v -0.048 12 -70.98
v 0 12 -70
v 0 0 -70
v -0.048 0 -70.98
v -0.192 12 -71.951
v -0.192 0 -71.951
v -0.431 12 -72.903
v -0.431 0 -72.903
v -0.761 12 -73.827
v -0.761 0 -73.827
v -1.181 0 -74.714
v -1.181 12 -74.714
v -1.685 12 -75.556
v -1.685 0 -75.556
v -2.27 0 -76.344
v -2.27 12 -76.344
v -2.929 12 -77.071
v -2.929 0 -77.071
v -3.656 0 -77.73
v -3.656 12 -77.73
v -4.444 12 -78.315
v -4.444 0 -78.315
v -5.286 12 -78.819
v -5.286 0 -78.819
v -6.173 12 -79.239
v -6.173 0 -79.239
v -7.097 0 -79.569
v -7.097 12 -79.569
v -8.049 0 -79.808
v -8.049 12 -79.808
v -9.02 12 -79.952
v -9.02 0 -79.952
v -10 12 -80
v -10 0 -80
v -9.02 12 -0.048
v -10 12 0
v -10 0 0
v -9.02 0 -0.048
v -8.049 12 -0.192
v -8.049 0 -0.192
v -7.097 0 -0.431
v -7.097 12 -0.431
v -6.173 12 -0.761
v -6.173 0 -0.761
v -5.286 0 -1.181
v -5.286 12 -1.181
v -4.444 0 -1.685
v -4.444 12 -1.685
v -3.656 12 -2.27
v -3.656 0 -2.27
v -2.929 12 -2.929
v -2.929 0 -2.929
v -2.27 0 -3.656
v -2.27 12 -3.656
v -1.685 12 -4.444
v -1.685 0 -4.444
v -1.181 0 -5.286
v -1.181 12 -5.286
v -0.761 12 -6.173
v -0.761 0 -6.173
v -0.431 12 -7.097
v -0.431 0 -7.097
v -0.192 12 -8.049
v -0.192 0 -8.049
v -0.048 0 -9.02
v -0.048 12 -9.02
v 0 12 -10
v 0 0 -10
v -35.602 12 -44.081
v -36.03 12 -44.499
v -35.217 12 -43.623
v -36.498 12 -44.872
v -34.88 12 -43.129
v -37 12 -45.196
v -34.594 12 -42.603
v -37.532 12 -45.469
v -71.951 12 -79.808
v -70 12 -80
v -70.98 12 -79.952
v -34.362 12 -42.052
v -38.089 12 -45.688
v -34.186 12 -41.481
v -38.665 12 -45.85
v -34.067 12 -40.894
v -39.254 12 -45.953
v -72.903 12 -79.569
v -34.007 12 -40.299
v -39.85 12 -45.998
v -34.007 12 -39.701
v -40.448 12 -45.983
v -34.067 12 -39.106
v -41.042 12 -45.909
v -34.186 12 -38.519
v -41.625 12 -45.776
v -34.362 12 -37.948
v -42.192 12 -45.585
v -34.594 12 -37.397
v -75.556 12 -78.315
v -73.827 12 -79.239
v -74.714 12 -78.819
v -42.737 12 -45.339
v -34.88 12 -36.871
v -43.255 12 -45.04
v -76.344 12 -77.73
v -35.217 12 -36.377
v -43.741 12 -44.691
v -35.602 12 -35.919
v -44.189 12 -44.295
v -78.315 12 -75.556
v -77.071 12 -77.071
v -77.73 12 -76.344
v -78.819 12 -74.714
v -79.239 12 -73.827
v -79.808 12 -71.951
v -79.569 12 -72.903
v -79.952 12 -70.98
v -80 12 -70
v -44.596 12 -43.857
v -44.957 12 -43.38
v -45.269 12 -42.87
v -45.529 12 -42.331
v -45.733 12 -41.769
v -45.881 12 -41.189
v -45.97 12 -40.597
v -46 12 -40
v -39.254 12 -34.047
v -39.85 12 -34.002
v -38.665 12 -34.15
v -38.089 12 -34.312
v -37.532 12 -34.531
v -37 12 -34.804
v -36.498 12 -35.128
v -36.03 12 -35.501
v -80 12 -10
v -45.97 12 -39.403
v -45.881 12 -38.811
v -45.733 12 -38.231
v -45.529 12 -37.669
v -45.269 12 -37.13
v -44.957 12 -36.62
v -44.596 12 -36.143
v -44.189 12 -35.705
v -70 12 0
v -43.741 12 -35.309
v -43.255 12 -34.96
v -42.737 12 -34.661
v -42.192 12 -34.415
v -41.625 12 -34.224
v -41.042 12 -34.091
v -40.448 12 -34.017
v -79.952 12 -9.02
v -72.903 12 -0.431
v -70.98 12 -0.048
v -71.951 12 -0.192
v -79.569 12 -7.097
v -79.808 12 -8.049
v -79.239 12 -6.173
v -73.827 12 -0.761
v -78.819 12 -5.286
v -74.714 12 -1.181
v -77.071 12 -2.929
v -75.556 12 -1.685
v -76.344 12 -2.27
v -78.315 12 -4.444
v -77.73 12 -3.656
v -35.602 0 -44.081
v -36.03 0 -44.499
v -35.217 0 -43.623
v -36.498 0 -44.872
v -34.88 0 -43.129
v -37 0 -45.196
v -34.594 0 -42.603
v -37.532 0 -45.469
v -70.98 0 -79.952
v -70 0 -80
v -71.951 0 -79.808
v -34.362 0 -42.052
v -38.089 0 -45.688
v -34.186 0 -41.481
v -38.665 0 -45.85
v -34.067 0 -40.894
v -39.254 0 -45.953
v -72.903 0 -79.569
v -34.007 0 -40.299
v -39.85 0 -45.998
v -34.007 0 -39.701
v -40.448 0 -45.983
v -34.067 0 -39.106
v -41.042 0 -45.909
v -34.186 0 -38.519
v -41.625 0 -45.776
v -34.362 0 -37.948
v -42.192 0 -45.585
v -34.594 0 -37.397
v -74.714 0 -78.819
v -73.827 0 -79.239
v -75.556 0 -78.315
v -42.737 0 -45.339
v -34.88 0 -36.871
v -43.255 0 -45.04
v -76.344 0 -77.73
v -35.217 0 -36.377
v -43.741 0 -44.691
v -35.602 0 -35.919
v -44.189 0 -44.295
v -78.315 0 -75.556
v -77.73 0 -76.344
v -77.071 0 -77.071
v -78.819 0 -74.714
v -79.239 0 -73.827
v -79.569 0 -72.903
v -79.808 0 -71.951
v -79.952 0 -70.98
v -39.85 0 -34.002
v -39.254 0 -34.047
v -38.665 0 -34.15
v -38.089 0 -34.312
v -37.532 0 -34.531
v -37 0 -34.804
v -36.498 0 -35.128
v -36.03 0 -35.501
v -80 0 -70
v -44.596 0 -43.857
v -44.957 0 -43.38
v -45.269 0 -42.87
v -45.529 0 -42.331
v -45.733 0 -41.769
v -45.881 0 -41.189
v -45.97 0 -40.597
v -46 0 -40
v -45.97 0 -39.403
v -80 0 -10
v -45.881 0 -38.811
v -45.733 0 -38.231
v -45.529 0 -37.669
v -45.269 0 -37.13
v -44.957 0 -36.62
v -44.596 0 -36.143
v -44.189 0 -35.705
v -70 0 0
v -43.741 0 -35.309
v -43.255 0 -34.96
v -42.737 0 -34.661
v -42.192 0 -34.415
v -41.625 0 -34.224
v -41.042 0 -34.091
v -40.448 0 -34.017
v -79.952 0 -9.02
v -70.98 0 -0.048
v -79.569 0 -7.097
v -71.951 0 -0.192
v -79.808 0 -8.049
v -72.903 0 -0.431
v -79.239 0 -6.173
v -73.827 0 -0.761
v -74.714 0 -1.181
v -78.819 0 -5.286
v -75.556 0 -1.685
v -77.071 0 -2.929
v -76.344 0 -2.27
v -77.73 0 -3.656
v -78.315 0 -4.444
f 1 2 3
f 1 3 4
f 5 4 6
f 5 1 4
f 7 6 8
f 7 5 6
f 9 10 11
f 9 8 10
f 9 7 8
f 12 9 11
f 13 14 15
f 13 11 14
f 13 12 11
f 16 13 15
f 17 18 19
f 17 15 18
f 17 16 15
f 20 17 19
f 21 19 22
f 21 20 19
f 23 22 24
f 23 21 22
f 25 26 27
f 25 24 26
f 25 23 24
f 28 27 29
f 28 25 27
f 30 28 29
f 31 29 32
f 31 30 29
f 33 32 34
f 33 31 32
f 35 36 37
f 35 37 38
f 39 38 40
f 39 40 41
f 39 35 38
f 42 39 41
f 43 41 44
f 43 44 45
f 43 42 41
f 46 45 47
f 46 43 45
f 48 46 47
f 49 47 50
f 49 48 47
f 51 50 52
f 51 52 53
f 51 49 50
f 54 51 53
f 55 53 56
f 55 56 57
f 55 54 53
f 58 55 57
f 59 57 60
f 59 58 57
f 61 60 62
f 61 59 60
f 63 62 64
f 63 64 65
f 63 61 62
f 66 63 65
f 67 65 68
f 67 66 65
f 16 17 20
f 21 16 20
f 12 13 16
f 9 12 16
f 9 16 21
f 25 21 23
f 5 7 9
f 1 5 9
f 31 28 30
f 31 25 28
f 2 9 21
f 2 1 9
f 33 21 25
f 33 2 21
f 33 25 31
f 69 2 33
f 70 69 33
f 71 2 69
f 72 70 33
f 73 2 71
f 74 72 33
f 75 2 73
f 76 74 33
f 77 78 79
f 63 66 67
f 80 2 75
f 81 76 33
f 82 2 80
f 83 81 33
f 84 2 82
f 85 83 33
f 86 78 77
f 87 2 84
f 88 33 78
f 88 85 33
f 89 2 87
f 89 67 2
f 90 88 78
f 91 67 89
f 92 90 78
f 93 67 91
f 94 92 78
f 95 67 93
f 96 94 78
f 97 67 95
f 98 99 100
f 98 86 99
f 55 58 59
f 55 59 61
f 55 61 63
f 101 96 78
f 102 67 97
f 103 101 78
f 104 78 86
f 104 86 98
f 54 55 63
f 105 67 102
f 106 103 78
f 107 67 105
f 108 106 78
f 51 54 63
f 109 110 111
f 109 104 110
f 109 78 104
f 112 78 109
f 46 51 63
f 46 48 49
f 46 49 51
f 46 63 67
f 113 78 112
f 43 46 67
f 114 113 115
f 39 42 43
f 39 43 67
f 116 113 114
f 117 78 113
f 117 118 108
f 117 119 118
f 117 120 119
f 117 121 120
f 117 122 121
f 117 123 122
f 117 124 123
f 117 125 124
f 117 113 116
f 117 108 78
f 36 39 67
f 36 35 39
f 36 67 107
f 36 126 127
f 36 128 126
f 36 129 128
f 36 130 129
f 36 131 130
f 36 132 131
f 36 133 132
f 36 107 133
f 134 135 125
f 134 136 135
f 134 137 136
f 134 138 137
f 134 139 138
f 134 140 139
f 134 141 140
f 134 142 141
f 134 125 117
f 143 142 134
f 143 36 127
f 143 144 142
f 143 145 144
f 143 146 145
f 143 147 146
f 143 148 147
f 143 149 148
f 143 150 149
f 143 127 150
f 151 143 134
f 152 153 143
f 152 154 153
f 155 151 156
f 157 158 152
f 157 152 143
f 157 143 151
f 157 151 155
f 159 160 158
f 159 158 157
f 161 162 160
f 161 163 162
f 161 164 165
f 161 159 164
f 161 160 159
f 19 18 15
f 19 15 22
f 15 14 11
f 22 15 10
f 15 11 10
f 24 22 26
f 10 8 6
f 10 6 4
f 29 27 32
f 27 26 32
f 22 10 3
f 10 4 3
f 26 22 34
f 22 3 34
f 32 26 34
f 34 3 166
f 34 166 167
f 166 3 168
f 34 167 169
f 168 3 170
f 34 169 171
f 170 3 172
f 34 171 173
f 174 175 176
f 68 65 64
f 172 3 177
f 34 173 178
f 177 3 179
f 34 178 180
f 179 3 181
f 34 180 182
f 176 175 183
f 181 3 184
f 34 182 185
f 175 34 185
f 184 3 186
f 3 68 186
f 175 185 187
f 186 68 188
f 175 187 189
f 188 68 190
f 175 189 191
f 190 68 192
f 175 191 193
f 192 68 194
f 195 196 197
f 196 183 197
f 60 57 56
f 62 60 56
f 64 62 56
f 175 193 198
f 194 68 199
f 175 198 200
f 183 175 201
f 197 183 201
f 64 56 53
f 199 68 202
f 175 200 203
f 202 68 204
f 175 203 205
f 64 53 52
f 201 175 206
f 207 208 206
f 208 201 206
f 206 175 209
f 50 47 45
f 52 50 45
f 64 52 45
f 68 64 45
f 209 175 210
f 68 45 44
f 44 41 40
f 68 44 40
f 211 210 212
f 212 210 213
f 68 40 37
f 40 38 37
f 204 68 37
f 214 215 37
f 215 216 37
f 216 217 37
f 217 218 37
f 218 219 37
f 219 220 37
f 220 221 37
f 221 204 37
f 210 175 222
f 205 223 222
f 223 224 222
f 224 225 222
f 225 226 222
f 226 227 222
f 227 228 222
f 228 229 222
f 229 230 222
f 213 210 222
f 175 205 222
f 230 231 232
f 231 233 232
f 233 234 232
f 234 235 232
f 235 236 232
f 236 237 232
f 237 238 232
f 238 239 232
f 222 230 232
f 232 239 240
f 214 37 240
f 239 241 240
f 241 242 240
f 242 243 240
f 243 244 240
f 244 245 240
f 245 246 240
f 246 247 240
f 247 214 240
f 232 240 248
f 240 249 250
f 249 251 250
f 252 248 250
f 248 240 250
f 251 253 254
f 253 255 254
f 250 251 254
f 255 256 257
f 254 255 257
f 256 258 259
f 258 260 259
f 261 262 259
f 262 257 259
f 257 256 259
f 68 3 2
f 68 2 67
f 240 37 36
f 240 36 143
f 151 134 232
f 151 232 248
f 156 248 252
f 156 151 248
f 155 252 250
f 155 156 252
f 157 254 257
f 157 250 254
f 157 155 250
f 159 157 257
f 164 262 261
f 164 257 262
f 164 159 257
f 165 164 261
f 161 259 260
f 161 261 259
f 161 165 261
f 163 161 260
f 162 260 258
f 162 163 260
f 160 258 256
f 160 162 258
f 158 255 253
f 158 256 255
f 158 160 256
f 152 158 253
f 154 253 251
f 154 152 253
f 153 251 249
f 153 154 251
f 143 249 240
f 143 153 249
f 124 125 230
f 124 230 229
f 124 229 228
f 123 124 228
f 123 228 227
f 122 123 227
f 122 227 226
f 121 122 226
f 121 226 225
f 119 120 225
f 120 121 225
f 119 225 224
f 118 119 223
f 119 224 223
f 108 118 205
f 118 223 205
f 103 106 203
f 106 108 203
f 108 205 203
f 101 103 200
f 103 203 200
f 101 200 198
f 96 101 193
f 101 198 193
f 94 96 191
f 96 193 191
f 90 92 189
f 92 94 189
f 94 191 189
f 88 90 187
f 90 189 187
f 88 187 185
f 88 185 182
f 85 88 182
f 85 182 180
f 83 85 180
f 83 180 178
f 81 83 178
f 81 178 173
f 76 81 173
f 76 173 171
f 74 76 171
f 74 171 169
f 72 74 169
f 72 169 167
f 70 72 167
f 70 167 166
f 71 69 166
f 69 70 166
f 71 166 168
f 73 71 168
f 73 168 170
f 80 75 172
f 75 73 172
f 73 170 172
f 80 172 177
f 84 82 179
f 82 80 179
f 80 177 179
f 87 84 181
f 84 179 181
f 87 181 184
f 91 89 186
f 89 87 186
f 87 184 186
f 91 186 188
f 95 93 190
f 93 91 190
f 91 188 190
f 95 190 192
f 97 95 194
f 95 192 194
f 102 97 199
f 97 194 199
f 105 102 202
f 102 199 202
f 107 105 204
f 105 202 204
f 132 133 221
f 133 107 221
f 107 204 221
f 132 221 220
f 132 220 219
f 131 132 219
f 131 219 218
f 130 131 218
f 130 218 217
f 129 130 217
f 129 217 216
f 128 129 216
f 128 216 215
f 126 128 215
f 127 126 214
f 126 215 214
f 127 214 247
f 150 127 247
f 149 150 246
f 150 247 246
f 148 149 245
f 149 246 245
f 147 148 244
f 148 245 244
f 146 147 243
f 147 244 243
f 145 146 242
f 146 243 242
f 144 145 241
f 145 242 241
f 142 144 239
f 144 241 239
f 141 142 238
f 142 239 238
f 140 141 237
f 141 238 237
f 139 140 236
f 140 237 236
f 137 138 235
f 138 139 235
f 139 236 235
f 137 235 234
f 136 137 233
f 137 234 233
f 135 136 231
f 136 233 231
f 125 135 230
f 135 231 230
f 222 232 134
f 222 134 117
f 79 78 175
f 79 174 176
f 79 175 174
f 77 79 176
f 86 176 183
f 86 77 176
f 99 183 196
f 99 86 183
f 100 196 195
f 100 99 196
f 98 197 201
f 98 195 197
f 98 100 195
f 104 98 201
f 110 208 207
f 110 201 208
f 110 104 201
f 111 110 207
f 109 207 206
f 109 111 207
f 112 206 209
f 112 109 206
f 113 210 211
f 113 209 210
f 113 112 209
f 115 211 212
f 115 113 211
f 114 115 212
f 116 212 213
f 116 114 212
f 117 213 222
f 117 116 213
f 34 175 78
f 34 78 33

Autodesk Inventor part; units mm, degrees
ref_plane "YZ Plane" through (0, 0, 0) normal (1, 0, 0) x (0, 1, 0)
ref_plane "XZ Plane" through (0, 0, 0) normal (0, 1, 0) x (-1, 0, 0)
ref_plane "XY Plane" through (0, 0, 0) normal (0, 0, 1) x (1, 0, 0)
sketch "Esboço1" plane through (0, 0, 0) normal (0, 1, 0) x (-1, 0, 0)
  line L0 (0, 0) -> (80, 0)
  line L1 (80, 0) -> (80, -80)
  line L2 (80, -80) -> (0, -80)
  line L3 (0, -80) -> (0, 0)
  circle A0 centre (40, -40) radius 6
  dimension "d0" = 80
  dimension "d1" = 80
  dimension "d2" = 12
extrude "Extrusão1" add sketch "Esboço1" along normal blind 12
fillet "Arredondamento1" radius 10 4 edges at (-80, 6, 0) (0, 6, 0) (0, 6, -80) (-80, 6, -80)
properties part number "Calorímetro_montagem"
